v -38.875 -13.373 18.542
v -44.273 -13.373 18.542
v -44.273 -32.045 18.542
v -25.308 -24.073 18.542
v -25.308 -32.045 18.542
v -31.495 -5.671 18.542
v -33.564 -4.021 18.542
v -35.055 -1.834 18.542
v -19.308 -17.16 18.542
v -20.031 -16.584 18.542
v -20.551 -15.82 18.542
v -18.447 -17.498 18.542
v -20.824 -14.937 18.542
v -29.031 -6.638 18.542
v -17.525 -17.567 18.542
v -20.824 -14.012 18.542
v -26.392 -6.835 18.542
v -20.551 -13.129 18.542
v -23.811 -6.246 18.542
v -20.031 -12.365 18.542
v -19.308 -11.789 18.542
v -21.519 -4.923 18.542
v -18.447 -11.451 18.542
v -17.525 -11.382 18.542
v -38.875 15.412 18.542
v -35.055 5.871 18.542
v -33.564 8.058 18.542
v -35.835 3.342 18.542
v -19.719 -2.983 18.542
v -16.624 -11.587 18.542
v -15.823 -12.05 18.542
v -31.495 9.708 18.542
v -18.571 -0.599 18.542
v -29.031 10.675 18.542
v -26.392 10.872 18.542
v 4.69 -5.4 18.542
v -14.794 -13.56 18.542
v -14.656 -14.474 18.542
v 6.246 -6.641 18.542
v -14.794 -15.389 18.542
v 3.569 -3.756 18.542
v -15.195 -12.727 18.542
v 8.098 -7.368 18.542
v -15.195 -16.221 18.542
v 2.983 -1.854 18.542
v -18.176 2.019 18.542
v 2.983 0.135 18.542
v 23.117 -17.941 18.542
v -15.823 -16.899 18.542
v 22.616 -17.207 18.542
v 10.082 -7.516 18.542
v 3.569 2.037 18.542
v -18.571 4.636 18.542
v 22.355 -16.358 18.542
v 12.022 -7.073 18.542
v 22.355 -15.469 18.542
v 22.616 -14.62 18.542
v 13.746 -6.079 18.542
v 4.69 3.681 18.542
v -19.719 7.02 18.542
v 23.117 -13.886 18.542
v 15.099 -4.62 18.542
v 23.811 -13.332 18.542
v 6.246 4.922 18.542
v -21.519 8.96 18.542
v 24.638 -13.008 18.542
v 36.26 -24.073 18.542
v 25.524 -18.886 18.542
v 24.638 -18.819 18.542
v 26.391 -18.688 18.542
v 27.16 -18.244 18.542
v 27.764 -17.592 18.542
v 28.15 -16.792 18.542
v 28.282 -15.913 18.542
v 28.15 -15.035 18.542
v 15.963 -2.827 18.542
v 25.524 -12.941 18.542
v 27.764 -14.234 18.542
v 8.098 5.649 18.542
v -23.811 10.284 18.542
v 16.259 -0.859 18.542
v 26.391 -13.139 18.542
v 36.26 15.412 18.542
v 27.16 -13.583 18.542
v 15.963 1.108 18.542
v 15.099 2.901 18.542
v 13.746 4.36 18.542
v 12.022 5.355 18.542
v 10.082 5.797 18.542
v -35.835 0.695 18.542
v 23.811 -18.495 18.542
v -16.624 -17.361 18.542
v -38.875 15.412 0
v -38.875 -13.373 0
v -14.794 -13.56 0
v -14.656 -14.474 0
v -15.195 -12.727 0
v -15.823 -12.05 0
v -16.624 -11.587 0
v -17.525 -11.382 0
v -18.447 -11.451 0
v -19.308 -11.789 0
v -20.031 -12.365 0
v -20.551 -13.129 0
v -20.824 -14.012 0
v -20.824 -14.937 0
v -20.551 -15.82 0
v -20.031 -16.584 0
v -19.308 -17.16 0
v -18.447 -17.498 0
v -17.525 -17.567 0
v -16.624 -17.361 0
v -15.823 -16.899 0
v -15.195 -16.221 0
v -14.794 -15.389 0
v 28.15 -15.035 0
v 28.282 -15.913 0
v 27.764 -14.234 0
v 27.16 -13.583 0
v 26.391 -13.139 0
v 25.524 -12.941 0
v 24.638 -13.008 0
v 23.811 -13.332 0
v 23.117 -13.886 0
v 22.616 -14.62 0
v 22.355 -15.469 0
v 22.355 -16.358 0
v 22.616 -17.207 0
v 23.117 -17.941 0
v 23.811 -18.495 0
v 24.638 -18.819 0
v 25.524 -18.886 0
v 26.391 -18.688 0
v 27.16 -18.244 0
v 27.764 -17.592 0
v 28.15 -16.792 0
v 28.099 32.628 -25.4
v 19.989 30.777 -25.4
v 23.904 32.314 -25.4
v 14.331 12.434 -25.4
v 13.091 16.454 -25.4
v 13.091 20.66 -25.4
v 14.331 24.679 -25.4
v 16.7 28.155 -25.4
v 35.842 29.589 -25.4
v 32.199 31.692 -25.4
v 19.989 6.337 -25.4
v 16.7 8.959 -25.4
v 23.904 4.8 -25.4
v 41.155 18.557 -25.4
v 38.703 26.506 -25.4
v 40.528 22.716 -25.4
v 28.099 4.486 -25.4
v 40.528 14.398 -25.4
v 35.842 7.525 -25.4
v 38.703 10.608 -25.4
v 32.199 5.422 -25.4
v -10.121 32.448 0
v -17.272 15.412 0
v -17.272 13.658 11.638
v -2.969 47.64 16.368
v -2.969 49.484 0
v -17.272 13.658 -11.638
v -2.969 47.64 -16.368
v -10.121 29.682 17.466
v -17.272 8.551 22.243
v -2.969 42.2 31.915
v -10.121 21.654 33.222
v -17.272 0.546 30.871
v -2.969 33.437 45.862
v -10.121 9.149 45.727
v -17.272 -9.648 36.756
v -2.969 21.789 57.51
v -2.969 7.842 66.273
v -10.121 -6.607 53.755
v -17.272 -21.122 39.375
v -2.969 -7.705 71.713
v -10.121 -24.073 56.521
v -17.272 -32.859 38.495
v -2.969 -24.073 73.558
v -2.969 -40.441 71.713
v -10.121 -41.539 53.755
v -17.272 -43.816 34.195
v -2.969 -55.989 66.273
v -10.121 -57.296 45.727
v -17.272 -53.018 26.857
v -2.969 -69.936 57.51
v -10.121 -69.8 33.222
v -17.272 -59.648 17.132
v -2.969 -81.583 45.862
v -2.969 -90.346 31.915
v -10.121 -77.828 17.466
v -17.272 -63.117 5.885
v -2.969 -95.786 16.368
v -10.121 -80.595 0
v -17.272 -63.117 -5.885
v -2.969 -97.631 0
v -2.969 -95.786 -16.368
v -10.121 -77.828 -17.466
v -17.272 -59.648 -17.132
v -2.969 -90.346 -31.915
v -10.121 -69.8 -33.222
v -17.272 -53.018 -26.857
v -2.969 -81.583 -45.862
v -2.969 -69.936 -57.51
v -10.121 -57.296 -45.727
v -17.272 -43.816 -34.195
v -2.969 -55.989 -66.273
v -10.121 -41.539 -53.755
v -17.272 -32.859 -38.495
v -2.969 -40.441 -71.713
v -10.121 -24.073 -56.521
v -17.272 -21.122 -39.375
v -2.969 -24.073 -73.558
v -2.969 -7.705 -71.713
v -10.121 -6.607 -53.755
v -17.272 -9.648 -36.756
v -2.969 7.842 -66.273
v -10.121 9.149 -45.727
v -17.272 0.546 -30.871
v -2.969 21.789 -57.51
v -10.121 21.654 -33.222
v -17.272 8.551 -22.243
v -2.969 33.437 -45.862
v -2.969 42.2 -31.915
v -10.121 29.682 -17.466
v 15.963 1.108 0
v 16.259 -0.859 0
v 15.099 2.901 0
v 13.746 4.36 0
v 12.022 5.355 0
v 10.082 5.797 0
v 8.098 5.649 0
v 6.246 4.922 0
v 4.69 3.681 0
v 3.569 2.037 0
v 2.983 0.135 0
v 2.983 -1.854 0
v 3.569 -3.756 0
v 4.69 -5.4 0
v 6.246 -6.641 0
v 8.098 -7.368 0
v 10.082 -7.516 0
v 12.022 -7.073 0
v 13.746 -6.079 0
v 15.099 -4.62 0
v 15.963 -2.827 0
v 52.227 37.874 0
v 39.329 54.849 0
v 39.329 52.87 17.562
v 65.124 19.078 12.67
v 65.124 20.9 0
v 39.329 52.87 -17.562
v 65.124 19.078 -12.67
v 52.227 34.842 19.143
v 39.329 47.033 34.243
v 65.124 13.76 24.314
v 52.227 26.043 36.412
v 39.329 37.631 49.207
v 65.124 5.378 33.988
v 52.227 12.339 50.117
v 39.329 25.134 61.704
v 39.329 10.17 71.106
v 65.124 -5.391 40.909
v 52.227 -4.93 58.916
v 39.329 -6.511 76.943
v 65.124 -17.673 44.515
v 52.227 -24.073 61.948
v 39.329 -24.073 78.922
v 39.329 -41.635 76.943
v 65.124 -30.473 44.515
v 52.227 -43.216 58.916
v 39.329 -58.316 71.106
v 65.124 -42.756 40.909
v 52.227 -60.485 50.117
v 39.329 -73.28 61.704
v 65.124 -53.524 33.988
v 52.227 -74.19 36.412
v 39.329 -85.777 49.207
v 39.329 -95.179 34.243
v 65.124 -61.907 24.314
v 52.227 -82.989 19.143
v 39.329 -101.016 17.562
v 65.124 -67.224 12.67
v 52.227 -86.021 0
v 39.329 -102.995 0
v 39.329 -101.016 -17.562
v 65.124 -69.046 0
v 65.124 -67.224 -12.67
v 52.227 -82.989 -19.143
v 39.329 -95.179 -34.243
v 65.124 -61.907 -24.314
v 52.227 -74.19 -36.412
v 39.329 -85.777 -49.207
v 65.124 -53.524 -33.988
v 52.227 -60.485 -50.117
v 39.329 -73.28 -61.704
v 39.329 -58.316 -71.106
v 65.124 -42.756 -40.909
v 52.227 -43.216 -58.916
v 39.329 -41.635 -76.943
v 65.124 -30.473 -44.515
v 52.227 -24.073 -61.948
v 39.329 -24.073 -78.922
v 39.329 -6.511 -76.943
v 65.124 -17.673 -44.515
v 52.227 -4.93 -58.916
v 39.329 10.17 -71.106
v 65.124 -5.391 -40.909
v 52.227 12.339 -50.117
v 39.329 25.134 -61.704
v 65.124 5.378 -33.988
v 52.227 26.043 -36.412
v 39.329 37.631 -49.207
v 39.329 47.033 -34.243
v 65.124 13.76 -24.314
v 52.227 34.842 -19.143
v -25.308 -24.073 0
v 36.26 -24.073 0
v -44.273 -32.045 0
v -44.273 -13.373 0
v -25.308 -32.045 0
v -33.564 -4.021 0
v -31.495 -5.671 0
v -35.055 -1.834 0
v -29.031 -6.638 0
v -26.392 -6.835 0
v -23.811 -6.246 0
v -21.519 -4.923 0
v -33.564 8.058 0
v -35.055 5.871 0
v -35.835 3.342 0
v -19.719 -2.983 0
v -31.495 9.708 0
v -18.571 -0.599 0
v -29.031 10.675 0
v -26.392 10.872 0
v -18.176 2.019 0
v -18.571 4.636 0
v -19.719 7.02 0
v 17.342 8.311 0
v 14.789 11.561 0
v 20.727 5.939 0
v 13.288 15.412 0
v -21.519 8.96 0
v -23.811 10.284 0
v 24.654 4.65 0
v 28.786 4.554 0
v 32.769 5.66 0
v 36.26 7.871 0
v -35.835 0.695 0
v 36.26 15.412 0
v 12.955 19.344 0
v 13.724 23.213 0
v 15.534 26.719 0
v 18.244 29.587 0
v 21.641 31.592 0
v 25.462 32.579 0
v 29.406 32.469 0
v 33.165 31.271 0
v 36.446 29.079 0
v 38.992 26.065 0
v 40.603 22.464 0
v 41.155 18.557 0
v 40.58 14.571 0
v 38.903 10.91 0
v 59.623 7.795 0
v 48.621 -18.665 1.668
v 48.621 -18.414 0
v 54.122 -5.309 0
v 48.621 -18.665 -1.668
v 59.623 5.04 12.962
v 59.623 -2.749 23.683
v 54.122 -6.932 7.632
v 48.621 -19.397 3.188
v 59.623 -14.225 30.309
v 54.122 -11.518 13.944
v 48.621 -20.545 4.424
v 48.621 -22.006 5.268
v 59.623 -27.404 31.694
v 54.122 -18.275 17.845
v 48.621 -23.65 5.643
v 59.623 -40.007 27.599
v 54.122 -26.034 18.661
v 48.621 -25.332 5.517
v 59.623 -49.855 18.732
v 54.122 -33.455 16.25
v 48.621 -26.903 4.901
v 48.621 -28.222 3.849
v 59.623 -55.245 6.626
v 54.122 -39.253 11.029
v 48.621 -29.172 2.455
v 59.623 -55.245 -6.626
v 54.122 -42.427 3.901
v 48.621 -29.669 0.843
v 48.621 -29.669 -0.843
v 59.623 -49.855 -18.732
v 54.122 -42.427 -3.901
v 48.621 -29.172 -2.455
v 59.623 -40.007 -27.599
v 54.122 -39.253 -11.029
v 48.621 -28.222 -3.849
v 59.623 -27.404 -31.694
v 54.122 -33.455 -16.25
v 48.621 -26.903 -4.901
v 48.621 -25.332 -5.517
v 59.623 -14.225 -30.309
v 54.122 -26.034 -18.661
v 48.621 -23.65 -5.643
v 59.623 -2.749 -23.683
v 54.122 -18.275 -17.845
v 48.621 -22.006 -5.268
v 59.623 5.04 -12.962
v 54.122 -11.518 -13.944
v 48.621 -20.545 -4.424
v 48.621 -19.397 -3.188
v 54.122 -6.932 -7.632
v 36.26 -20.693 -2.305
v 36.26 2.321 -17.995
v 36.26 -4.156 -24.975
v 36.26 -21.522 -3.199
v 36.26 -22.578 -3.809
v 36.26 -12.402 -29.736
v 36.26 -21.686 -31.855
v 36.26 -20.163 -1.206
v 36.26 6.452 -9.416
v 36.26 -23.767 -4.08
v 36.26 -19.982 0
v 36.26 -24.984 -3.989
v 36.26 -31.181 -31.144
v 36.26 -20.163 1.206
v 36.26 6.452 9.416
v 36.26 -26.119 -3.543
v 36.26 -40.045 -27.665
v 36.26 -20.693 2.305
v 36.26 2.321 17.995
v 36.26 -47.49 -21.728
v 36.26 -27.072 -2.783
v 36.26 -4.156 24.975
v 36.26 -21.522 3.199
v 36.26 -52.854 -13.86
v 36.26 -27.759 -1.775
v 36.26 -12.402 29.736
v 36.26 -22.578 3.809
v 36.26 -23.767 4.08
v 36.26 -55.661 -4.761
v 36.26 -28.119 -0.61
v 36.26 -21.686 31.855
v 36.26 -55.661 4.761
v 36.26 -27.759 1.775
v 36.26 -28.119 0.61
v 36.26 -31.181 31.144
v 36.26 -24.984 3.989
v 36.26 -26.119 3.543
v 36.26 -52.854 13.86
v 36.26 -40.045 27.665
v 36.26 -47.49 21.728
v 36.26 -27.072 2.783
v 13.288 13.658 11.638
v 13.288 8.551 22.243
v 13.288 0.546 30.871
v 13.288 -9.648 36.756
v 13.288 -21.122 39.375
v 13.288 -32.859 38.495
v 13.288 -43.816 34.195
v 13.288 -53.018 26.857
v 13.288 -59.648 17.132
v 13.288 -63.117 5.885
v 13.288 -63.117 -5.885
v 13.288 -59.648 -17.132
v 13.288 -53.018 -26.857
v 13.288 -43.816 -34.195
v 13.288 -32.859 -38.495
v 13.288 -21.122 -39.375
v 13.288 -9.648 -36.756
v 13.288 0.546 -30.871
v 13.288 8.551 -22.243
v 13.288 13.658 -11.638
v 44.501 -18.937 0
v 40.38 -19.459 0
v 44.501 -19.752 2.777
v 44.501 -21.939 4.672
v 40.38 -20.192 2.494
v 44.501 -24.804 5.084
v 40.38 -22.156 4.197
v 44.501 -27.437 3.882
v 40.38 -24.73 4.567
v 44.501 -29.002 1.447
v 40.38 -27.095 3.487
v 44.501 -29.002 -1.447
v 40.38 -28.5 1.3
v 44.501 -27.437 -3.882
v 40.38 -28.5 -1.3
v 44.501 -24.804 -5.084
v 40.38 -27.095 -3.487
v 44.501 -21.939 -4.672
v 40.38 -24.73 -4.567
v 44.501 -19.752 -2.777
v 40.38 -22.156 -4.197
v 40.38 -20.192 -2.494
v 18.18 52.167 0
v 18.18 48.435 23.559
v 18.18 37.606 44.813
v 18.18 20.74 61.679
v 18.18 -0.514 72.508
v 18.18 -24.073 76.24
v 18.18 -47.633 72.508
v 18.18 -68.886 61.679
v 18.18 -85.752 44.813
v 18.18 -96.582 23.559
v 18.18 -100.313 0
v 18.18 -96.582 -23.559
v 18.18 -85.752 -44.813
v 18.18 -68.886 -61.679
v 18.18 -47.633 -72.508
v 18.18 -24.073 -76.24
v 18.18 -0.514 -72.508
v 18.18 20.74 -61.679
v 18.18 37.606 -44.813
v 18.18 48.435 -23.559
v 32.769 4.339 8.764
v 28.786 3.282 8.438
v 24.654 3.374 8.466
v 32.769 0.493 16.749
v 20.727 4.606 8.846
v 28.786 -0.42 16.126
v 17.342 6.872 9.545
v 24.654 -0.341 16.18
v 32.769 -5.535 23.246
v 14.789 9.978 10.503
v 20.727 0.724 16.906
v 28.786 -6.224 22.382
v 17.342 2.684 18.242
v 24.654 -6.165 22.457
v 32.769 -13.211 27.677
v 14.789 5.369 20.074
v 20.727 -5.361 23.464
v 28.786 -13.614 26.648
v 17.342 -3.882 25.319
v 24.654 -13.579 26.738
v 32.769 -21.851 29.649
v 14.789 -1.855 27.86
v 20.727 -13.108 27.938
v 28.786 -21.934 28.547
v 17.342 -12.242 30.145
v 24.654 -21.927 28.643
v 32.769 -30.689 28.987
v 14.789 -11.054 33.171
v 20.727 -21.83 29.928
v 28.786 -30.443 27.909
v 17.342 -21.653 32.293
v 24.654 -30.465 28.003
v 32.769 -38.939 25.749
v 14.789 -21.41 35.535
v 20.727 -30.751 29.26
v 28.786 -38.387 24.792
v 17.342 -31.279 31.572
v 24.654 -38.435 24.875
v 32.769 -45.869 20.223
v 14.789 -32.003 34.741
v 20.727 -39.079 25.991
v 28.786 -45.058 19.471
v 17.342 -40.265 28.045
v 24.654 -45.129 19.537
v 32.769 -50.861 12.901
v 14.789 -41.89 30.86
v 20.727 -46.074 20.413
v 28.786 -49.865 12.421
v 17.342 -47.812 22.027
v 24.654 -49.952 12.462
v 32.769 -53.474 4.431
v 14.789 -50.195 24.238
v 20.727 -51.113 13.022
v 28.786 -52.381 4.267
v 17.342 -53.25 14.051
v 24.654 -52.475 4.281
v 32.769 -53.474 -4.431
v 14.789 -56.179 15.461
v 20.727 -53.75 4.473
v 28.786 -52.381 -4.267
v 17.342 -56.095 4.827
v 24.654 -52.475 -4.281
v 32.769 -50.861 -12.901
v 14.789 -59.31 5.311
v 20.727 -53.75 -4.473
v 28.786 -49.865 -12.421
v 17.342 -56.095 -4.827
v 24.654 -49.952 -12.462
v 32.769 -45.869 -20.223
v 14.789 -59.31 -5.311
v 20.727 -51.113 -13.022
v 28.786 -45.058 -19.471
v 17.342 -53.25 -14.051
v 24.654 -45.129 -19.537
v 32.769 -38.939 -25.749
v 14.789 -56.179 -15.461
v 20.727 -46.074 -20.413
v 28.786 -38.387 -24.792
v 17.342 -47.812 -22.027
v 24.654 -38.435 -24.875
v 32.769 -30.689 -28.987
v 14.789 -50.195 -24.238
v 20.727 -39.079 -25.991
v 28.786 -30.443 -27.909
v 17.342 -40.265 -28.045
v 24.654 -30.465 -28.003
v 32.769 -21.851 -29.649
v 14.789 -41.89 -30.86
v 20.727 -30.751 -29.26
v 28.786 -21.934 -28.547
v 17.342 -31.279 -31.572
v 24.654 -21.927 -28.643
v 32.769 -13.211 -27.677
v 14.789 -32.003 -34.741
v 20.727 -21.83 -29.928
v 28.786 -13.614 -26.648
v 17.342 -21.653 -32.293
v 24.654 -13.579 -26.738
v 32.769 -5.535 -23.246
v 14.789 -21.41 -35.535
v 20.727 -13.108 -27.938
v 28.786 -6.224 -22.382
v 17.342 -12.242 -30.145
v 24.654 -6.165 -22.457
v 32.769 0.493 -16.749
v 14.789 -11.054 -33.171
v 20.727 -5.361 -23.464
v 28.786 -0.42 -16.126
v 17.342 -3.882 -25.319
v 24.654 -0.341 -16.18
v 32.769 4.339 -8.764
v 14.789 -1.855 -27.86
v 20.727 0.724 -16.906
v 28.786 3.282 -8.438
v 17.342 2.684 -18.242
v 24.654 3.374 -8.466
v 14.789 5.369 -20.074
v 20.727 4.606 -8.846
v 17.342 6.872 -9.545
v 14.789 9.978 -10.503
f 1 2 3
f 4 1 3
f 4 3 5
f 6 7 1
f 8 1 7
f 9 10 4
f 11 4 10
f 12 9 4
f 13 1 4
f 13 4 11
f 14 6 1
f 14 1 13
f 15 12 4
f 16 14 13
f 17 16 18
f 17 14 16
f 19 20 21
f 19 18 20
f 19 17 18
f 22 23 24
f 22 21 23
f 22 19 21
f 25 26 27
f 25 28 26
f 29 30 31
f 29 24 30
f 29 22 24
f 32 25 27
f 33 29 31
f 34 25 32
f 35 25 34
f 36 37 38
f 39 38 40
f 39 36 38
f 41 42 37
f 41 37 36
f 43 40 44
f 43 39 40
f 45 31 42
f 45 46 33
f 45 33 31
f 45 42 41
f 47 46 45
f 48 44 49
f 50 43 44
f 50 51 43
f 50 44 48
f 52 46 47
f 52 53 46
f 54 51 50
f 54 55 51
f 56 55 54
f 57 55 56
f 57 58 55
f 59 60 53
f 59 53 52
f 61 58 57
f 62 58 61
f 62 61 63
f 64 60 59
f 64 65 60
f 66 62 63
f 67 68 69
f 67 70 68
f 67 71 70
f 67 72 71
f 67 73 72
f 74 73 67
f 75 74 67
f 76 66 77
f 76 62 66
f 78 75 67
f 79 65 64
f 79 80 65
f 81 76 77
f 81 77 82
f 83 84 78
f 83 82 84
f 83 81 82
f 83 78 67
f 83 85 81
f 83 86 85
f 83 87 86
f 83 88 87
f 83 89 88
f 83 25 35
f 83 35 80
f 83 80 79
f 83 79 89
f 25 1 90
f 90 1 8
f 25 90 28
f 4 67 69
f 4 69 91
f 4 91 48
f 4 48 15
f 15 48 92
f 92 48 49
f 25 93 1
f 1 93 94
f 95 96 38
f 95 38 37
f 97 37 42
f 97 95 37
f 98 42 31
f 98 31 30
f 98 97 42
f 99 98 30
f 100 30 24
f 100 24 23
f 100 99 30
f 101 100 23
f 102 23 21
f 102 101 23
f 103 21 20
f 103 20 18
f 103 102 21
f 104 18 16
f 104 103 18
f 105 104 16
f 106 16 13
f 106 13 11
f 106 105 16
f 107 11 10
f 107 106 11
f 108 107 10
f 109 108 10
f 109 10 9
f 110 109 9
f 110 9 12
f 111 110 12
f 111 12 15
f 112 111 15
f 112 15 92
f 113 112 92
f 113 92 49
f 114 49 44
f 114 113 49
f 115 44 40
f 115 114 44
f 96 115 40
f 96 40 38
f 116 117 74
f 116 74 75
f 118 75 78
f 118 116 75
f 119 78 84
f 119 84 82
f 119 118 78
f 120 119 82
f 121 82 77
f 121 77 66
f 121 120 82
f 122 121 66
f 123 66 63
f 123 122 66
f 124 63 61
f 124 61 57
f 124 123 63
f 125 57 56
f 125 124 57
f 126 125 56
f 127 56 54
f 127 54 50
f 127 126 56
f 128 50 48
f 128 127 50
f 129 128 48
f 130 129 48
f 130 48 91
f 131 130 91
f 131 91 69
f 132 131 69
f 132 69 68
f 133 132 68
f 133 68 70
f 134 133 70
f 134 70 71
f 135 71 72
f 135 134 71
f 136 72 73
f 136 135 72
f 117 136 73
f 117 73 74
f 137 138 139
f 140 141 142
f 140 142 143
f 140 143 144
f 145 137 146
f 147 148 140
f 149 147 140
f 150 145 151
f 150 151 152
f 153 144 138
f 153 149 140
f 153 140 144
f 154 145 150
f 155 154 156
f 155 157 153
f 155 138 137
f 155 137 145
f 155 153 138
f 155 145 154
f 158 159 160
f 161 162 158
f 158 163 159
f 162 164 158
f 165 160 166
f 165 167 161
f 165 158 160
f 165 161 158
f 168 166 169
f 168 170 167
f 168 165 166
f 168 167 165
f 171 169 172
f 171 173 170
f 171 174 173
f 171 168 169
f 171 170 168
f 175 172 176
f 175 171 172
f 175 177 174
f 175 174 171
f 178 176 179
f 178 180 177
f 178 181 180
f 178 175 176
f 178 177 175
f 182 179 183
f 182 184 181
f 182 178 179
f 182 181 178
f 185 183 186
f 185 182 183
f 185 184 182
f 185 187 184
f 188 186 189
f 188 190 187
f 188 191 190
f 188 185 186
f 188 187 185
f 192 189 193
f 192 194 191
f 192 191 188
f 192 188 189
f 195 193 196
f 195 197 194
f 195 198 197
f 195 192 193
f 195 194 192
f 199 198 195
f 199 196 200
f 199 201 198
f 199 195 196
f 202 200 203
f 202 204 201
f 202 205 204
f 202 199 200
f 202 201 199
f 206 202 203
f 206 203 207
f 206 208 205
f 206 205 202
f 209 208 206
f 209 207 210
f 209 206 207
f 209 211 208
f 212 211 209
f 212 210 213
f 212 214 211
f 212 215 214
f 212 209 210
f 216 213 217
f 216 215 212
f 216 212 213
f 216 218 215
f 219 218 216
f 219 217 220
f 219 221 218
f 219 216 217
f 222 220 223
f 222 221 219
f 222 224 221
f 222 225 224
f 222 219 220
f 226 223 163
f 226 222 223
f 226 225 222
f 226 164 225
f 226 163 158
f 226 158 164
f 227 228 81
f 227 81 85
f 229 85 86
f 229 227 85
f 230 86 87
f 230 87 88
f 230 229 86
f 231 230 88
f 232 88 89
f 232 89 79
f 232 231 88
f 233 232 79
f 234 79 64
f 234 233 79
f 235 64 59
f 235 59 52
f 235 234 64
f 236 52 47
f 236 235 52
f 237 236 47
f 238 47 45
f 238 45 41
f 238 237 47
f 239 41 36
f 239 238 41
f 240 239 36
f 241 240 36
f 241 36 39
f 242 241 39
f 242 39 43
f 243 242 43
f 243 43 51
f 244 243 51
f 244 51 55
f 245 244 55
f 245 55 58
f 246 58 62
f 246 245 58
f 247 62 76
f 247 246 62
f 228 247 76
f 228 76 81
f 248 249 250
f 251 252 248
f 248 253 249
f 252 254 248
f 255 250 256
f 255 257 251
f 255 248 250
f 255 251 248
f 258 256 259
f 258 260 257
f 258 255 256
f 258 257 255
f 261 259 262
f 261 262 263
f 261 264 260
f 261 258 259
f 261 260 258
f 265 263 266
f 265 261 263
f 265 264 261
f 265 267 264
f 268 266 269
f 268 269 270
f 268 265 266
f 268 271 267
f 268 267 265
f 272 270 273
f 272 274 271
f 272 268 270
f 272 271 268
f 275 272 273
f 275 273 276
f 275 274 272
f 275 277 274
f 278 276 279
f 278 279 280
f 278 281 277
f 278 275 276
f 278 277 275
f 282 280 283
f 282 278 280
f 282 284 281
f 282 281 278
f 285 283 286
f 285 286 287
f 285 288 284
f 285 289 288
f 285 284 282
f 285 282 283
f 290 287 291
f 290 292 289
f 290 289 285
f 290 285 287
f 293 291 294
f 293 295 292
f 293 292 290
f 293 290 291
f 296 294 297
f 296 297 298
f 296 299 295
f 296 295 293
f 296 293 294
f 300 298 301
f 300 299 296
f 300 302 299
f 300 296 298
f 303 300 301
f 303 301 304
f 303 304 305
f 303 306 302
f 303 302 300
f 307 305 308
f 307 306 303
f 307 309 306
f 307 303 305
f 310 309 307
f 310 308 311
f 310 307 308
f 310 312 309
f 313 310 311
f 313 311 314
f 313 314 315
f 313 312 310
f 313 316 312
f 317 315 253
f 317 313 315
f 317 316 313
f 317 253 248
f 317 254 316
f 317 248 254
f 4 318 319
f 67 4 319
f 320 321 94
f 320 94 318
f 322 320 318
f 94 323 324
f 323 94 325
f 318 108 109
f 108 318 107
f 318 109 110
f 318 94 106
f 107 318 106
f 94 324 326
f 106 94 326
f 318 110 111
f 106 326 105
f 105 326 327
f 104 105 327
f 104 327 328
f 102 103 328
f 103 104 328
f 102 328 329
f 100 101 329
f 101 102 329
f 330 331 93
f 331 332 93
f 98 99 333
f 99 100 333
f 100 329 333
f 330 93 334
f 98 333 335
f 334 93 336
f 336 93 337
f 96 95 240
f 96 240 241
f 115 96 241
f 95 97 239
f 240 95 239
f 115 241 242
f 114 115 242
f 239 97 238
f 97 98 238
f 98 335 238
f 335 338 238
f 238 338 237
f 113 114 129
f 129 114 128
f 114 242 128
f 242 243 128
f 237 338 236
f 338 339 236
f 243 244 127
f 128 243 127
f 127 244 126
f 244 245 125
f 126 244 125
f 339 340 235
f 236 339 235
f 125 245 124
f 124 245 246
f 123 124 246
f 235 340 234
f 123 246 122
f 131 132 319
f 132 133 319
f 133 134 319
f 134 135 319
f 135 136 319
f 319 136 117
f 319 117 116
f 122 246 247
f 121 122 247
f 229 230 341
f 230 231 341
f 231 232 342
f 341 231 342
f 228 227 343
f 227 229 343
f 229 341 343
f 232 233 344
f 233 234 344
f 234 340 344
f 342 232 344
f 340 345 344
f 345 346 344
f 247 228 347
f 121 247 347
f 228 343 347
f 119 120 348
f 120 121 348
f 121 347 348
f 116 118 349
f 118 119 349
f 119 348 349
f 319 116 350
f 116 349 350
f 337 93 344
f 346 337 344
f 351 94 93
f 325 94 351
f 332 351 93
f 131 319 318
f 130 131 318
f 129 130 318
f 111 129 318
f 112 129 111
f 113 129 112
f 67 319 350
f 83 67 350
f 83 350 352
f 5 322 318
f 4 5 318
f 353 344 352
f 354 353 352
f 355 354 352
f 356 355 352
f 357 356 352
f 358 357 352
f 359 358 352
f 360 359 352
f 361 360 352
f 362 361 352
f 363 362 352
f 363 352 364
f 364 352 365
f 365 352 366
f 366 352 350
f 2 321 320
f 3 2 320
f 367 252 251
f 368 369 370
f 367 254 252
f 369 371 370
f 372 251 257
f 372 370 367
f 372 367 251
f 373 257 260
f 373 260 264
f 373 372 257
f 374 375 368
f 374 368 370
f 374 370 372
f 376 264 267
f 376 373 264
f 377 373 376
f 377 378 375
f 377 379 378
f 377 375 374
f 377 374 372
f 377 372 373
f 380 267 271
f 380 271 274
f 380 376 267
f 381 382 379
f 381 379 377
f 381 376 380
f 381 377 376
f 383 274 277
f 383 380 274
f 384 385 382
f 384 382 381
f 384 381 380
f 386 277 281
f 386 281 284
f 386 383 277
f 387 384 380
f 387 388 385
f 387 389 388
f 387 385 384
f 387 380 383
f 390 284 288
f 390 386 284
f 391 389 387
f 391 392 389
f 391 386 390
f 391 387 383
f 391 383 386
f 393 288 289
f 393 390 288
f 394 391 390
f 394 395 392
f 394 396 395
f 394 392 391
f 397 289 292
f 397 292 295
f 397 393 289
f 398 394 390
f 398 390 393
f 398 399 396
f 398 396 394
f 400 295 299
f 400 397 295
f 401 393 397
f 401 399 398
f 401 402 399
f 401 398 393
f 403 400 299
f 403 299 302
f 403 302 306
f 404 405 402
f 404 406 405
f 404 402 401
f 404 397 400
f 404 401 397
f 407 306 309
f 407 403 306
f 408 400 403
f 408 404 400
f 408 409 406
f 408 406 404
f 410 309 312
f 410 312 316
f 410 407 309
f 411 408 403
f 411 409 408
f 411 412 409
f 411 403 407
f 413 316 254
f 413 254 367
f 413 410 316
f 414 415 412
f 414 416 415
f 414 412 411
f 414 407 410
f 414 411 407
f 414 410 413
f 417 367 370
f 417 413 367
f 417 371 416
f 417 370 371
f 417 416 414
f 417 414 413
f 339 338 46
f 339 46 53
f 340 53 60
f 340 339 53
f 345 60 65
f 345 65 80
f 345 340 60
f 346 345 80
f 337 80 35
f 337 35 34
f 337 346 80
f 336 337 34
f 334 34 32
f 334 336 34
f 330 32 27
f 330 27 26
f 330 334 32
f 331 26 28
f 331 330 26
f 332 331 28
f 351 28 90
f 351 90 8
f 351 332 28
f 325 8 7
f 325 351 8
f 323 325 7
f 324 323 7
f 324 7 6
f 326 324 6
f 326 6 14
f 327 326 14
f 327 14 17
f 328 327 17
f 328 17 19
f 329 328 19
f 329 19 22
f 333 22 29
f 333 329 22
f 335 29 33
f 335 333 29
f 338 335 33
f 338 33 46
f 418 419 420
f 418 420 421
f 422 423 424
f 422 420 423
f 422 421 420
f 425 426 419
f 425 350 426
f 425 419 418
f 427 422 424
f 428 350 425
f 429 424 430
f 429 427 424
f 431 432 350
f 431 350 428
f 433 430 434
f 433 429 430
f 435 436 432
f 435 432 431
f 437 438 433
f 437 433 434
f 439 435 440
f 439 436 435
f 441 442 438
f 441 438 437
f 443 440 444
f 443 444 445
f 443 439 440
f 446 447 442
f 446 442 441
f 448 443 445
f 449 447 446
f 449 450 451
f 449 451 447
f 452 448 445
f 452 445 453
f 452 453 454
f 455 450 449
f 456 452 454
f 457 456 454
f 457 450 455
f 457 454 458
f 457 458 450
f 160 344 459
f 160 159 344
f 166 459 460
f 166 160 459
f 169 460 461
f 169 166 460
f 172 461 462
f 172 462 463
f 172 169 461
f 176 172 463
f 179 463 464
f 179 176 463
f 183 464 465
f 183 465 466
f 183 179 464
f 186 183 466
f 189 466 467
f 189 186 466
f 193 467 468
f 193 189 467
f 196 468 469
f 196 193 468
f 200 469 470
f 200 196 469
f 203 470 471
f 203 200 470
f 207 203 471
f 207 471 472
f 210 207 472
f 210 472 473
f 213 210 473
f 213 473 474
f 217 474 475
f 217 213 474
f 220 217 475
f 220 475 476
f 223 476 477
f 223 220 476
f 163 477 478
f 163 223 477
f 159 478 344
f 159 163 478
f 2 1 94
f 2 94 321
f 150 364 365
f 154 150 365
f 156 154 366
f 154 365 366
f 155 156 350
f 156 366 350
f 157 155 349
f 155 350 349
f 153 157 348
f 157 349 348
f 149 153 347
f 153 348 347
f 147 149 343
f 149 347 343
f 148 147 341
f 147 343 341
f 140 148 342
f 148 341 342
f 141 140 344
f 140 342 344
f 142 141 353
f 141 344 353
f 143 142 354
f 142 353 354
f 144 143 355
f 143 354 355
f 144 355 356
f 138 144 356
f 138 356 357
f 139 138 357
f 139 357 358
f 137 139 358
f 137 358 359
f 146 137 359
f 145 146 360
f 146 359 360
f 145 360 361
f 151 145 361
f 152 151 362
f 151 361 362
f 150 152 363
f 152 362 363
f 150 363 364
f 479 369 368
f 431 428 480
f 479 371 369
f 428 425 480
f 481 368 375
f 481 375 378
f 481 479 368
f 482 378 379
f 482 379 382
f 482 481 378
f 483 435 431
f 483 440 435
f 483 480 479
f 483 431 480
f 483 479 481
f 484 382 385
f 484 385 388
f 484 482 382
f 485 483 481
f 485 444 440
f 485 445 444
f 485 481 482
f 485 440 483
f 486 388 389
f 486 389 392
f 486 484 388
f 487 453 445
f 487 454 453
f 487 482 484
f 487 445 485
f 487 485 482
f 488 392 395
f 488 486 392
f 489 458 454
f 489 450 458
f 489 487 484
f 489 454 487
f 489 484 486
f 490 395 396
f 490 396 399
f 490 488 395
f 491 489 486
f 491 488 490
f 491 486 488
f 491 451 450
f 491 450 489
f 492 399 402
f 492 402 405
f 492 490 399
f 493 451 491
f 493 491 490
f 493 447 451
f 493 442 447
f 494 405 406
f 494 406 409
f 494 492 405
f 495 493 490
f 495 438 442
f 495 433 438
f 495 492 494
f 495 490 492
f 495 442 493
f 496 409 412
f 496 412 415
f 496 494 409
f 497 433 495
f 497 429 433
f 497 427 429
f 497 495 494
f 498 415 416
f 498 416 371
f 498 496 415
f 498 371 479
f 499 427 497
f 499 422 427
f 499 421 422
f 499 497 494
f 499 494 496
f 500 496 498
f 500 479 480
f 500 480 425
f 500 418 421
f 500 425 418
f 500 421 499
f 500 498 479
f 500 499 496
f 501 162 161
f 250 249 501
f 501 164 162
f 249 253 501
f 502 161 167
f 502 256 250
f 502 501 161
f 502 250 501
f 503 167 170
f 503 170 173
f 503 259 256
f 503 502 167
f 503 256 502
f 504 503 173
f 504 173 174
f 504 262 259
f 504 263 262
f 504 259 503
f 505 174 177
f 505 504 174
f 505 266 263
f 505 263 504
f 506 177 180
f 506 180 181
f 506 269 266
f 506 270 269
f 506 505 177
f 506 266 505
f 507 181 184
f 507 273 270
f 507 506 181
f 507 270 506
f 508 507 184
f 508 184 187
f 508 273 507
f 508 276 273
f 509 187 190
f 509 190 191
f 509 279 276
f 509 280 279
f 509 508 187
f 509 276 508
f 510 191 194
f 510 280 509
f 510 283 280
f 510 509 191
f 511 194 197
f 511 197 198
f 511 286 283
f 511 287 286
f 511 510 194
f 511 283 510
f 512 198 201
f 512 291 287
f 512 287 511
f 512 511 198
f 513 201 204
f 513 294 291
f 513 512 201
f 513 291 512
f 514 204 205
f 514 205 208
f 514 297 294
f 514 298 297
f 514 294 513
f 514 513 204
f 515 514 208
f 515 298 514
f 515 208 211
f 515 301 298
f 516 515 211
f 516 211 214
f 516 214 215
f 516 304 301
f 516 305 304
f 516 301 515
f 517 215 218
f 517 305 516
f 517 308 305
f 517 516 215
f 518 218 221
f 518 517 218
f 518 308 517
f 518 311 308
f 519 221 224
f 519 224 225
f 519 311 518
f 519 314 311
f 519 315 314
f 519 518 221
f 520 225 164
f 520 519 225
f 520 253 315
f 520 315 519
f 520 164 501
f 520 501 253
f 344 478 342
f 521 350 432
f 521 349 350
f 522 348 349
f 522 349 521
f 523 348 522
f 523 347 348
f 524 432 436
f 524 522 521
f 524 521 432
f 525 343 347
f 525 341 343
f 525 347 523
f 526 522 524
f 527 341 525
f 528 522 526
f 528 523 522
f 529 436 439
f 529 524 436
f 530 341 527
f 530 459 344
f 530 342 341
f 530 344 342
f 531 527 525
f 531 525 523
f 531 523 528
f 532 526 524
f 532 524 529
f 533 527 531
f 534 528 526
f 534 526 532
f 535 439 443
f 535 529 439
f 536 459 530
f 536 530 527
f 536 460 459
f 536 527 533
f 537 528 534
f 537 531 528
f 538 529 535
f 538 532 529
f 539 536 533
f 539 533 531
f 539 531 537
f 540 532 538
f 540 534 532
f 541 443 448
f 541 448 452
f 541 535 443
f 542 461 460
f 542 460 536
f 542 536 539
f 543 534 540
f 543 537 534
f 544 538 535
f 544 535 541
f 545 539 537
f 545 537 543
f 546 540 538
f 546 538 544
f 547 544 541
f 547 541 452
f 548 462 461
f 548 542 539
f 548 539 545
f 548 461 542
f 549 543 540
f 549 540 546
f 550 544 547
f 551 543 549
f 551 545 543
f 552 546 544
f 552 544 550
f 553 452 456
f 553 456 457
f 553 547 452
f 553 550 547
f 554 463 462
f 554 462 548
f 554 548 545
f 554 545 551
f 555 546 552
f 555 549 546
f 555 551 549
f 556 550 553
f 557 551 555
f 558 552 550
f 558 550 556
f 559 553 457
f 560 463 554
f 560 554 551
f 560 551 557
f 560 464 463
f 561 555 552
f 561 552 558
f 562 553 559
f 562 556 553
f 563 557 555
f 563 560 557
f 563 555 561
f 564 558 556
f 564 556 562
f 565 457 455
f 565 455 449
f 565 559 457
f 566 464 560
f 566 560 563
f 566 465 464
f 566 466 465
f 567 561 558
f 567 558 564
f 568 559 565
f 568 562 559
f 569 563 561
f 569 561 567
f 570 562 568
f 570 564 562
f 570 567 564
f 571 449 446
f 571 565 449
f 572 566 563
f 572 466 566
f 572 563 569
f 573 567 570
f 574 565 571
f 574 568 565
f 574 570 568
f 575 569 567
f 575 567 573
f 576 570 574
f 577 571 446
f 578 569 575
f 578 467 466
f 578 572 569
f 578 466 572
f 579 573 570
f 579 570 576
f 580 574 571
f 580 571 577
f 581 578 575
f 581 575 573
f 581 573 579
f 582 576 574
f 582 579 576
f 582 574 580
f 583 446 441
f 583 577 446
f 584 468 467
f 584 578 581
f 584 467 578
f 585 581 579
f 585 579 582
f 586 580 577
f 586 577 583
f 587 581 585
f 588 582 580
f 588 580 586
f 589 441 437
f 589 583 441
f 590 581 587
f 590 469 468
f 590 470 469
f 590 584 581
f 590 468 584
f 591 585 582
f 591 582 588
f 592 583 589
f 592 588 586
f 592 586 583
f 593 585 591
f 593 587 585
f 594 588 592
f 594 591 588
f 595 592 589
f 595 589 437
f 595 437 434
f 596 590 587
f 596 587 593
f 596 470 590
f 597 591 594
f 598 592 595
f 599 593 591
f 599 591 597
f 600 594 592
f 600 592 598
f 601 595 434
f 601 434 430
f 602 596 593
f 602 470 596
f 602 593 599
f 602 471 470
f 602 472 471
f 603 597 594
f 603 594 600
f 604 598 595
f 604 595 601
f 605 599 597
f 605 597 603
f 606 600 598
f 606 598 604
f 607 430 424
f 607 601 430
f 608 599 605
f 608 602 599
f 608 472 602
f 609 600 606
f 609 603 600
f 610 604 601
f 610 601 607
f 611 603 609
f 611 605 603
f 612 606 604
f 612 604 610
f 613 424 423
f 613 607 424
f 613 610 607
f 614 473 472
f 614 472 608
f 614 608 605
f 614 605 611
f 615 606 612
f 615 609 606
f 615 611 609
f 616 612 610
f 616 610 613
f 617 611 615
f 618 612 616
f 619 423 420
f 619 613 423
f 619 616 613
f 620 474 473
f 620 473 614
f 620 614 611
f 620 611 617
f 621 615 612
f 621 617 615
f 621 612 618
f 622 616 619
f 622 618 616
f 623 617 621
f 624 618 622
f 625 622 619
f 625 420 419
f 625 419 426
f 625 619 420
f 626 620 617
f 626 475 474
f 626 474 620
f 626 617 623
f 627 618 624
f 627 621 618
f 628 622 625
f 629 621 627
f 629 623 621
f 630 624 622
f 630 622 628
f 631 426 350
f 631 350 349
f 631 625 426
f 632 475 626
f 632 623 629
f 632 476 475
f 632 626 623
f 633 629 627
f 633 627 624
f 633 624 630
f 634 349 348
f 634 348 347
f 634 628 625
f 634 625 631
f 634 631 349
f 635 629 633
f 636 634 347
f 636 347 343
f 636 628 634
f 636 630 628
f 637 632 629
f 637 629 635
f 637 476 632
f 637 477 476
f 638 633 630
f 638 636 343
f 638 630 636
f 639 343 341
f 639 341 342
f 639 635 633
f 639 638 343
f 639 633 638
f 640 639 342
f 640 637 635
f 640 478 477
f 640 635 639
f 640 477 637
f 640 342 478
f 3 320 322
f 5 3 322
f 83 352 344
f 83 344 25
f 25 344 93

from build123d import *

# Parameters (mm, degrees)
F0_R     = 3.1013234417
F0_R_2   = 2.9804457563
F0_R_3   = 8.8787695935
F0_R_4   = 6.6755002606
F0_W     = 13.5676767677
F0_H     = 10.6998383999
F1_DEPTH = 18.542
F2_R     = 14.1107423838
F3_DEPTH = 25.4


with BuildPart() as f1:
    # F0 (on Top) → F1 (new body)
    with BuildSketch(Plane.XY):
        Polygon((36.2601056695, 15.412141569), (-38.8753563166, 15.412141569), (-38.8753563166, -13.3732762188), (-25.3076795489, -13.3732762188), (-25.3076795489, -24.0731146187), (36.2601056695, -24.0731146187), align=None)
        with Locations((-17.7570972592, -14.4744245335)):
            Circle(F0_R, mode=Mode.SUBTRACT)
        with Locations((25.30169487, -15.913406387)):
            Circle(F0_R_2, mode=Mode.SUBTRACT)
        with Locations((-27.0551405847, 2.0185327157)):
            Circle(F0_R_3, mode=Mode.SUBTRACT)
        with Locations((9.583575651, -0.8594332612)):
            Circle(F0_R_4, mode=Mode.SUBTRACT)
        Polygon((-38.8753563166, -24.0731146187), (-38.8753563166, -13.3732762188), (-44.2731007934, -13.3732762188), (-44.2731007934, -32.0454165339), (-25.3076795489, -32.0454165339), (-25.3076795489, -24.0731146187), align=None)
        with Locations((-32.0915179327, -18.7231954187)):
            Rectangle(F0_W, F0_H)
    extrude(amount=F1_DEPTH)

    # F2 (on face) → F3 (join)
    with BuildSketch(Plane(origin=(0, 0, 0), x_dir=(1, 0, 0), z_dir=(0, 0, -1))):
        with Locations((27.0440354943, -18.5568481684)):
            Circle(F2_R)
    extrude(amount=F3_DEPTH)


with BuildPart() as f6:
    # F5 (on face) → F6 (revolve)
    with BuildSketch(Plane(origin=(0, 0, 0), x_dir=(1, 0, 0), z_dir=(0, 0, -1))):
        with BuildLine():
            Line((65.124420279, -20.8997673818), (48.6210381451, 18.414020864))
            Line((48.6210381451, 18.414020864), (36.2601056695, 19.9817100092))
            Line((36.2601056695, 19.9817100092), (36.2601056695, -7.8714796137))
            ThreePointArc((36.2601056695, -7.8714796137), (22.6431453574, -5.1499388815), (13.2881687086, -15.412141569))
            Line((13.2881687086, -15.412141569), (-17.2721458917, -15.412141569))
            Line((-17.2721458917, -15.412141569), (-2.9690584007, -49.4844637342))
            Line((-2.9690584007, -49.4844637342), (39.329372006, -54.8490096809))
            Line((39.329372006, -54.8490096809), (65.124420279, -20.8997673818))
        make_face()
    revolve(axis=Axis((5.4762130603, -24.0731146187, 0), (1, 0, 0)))


solid = Compound([f1.part, f6.part])
